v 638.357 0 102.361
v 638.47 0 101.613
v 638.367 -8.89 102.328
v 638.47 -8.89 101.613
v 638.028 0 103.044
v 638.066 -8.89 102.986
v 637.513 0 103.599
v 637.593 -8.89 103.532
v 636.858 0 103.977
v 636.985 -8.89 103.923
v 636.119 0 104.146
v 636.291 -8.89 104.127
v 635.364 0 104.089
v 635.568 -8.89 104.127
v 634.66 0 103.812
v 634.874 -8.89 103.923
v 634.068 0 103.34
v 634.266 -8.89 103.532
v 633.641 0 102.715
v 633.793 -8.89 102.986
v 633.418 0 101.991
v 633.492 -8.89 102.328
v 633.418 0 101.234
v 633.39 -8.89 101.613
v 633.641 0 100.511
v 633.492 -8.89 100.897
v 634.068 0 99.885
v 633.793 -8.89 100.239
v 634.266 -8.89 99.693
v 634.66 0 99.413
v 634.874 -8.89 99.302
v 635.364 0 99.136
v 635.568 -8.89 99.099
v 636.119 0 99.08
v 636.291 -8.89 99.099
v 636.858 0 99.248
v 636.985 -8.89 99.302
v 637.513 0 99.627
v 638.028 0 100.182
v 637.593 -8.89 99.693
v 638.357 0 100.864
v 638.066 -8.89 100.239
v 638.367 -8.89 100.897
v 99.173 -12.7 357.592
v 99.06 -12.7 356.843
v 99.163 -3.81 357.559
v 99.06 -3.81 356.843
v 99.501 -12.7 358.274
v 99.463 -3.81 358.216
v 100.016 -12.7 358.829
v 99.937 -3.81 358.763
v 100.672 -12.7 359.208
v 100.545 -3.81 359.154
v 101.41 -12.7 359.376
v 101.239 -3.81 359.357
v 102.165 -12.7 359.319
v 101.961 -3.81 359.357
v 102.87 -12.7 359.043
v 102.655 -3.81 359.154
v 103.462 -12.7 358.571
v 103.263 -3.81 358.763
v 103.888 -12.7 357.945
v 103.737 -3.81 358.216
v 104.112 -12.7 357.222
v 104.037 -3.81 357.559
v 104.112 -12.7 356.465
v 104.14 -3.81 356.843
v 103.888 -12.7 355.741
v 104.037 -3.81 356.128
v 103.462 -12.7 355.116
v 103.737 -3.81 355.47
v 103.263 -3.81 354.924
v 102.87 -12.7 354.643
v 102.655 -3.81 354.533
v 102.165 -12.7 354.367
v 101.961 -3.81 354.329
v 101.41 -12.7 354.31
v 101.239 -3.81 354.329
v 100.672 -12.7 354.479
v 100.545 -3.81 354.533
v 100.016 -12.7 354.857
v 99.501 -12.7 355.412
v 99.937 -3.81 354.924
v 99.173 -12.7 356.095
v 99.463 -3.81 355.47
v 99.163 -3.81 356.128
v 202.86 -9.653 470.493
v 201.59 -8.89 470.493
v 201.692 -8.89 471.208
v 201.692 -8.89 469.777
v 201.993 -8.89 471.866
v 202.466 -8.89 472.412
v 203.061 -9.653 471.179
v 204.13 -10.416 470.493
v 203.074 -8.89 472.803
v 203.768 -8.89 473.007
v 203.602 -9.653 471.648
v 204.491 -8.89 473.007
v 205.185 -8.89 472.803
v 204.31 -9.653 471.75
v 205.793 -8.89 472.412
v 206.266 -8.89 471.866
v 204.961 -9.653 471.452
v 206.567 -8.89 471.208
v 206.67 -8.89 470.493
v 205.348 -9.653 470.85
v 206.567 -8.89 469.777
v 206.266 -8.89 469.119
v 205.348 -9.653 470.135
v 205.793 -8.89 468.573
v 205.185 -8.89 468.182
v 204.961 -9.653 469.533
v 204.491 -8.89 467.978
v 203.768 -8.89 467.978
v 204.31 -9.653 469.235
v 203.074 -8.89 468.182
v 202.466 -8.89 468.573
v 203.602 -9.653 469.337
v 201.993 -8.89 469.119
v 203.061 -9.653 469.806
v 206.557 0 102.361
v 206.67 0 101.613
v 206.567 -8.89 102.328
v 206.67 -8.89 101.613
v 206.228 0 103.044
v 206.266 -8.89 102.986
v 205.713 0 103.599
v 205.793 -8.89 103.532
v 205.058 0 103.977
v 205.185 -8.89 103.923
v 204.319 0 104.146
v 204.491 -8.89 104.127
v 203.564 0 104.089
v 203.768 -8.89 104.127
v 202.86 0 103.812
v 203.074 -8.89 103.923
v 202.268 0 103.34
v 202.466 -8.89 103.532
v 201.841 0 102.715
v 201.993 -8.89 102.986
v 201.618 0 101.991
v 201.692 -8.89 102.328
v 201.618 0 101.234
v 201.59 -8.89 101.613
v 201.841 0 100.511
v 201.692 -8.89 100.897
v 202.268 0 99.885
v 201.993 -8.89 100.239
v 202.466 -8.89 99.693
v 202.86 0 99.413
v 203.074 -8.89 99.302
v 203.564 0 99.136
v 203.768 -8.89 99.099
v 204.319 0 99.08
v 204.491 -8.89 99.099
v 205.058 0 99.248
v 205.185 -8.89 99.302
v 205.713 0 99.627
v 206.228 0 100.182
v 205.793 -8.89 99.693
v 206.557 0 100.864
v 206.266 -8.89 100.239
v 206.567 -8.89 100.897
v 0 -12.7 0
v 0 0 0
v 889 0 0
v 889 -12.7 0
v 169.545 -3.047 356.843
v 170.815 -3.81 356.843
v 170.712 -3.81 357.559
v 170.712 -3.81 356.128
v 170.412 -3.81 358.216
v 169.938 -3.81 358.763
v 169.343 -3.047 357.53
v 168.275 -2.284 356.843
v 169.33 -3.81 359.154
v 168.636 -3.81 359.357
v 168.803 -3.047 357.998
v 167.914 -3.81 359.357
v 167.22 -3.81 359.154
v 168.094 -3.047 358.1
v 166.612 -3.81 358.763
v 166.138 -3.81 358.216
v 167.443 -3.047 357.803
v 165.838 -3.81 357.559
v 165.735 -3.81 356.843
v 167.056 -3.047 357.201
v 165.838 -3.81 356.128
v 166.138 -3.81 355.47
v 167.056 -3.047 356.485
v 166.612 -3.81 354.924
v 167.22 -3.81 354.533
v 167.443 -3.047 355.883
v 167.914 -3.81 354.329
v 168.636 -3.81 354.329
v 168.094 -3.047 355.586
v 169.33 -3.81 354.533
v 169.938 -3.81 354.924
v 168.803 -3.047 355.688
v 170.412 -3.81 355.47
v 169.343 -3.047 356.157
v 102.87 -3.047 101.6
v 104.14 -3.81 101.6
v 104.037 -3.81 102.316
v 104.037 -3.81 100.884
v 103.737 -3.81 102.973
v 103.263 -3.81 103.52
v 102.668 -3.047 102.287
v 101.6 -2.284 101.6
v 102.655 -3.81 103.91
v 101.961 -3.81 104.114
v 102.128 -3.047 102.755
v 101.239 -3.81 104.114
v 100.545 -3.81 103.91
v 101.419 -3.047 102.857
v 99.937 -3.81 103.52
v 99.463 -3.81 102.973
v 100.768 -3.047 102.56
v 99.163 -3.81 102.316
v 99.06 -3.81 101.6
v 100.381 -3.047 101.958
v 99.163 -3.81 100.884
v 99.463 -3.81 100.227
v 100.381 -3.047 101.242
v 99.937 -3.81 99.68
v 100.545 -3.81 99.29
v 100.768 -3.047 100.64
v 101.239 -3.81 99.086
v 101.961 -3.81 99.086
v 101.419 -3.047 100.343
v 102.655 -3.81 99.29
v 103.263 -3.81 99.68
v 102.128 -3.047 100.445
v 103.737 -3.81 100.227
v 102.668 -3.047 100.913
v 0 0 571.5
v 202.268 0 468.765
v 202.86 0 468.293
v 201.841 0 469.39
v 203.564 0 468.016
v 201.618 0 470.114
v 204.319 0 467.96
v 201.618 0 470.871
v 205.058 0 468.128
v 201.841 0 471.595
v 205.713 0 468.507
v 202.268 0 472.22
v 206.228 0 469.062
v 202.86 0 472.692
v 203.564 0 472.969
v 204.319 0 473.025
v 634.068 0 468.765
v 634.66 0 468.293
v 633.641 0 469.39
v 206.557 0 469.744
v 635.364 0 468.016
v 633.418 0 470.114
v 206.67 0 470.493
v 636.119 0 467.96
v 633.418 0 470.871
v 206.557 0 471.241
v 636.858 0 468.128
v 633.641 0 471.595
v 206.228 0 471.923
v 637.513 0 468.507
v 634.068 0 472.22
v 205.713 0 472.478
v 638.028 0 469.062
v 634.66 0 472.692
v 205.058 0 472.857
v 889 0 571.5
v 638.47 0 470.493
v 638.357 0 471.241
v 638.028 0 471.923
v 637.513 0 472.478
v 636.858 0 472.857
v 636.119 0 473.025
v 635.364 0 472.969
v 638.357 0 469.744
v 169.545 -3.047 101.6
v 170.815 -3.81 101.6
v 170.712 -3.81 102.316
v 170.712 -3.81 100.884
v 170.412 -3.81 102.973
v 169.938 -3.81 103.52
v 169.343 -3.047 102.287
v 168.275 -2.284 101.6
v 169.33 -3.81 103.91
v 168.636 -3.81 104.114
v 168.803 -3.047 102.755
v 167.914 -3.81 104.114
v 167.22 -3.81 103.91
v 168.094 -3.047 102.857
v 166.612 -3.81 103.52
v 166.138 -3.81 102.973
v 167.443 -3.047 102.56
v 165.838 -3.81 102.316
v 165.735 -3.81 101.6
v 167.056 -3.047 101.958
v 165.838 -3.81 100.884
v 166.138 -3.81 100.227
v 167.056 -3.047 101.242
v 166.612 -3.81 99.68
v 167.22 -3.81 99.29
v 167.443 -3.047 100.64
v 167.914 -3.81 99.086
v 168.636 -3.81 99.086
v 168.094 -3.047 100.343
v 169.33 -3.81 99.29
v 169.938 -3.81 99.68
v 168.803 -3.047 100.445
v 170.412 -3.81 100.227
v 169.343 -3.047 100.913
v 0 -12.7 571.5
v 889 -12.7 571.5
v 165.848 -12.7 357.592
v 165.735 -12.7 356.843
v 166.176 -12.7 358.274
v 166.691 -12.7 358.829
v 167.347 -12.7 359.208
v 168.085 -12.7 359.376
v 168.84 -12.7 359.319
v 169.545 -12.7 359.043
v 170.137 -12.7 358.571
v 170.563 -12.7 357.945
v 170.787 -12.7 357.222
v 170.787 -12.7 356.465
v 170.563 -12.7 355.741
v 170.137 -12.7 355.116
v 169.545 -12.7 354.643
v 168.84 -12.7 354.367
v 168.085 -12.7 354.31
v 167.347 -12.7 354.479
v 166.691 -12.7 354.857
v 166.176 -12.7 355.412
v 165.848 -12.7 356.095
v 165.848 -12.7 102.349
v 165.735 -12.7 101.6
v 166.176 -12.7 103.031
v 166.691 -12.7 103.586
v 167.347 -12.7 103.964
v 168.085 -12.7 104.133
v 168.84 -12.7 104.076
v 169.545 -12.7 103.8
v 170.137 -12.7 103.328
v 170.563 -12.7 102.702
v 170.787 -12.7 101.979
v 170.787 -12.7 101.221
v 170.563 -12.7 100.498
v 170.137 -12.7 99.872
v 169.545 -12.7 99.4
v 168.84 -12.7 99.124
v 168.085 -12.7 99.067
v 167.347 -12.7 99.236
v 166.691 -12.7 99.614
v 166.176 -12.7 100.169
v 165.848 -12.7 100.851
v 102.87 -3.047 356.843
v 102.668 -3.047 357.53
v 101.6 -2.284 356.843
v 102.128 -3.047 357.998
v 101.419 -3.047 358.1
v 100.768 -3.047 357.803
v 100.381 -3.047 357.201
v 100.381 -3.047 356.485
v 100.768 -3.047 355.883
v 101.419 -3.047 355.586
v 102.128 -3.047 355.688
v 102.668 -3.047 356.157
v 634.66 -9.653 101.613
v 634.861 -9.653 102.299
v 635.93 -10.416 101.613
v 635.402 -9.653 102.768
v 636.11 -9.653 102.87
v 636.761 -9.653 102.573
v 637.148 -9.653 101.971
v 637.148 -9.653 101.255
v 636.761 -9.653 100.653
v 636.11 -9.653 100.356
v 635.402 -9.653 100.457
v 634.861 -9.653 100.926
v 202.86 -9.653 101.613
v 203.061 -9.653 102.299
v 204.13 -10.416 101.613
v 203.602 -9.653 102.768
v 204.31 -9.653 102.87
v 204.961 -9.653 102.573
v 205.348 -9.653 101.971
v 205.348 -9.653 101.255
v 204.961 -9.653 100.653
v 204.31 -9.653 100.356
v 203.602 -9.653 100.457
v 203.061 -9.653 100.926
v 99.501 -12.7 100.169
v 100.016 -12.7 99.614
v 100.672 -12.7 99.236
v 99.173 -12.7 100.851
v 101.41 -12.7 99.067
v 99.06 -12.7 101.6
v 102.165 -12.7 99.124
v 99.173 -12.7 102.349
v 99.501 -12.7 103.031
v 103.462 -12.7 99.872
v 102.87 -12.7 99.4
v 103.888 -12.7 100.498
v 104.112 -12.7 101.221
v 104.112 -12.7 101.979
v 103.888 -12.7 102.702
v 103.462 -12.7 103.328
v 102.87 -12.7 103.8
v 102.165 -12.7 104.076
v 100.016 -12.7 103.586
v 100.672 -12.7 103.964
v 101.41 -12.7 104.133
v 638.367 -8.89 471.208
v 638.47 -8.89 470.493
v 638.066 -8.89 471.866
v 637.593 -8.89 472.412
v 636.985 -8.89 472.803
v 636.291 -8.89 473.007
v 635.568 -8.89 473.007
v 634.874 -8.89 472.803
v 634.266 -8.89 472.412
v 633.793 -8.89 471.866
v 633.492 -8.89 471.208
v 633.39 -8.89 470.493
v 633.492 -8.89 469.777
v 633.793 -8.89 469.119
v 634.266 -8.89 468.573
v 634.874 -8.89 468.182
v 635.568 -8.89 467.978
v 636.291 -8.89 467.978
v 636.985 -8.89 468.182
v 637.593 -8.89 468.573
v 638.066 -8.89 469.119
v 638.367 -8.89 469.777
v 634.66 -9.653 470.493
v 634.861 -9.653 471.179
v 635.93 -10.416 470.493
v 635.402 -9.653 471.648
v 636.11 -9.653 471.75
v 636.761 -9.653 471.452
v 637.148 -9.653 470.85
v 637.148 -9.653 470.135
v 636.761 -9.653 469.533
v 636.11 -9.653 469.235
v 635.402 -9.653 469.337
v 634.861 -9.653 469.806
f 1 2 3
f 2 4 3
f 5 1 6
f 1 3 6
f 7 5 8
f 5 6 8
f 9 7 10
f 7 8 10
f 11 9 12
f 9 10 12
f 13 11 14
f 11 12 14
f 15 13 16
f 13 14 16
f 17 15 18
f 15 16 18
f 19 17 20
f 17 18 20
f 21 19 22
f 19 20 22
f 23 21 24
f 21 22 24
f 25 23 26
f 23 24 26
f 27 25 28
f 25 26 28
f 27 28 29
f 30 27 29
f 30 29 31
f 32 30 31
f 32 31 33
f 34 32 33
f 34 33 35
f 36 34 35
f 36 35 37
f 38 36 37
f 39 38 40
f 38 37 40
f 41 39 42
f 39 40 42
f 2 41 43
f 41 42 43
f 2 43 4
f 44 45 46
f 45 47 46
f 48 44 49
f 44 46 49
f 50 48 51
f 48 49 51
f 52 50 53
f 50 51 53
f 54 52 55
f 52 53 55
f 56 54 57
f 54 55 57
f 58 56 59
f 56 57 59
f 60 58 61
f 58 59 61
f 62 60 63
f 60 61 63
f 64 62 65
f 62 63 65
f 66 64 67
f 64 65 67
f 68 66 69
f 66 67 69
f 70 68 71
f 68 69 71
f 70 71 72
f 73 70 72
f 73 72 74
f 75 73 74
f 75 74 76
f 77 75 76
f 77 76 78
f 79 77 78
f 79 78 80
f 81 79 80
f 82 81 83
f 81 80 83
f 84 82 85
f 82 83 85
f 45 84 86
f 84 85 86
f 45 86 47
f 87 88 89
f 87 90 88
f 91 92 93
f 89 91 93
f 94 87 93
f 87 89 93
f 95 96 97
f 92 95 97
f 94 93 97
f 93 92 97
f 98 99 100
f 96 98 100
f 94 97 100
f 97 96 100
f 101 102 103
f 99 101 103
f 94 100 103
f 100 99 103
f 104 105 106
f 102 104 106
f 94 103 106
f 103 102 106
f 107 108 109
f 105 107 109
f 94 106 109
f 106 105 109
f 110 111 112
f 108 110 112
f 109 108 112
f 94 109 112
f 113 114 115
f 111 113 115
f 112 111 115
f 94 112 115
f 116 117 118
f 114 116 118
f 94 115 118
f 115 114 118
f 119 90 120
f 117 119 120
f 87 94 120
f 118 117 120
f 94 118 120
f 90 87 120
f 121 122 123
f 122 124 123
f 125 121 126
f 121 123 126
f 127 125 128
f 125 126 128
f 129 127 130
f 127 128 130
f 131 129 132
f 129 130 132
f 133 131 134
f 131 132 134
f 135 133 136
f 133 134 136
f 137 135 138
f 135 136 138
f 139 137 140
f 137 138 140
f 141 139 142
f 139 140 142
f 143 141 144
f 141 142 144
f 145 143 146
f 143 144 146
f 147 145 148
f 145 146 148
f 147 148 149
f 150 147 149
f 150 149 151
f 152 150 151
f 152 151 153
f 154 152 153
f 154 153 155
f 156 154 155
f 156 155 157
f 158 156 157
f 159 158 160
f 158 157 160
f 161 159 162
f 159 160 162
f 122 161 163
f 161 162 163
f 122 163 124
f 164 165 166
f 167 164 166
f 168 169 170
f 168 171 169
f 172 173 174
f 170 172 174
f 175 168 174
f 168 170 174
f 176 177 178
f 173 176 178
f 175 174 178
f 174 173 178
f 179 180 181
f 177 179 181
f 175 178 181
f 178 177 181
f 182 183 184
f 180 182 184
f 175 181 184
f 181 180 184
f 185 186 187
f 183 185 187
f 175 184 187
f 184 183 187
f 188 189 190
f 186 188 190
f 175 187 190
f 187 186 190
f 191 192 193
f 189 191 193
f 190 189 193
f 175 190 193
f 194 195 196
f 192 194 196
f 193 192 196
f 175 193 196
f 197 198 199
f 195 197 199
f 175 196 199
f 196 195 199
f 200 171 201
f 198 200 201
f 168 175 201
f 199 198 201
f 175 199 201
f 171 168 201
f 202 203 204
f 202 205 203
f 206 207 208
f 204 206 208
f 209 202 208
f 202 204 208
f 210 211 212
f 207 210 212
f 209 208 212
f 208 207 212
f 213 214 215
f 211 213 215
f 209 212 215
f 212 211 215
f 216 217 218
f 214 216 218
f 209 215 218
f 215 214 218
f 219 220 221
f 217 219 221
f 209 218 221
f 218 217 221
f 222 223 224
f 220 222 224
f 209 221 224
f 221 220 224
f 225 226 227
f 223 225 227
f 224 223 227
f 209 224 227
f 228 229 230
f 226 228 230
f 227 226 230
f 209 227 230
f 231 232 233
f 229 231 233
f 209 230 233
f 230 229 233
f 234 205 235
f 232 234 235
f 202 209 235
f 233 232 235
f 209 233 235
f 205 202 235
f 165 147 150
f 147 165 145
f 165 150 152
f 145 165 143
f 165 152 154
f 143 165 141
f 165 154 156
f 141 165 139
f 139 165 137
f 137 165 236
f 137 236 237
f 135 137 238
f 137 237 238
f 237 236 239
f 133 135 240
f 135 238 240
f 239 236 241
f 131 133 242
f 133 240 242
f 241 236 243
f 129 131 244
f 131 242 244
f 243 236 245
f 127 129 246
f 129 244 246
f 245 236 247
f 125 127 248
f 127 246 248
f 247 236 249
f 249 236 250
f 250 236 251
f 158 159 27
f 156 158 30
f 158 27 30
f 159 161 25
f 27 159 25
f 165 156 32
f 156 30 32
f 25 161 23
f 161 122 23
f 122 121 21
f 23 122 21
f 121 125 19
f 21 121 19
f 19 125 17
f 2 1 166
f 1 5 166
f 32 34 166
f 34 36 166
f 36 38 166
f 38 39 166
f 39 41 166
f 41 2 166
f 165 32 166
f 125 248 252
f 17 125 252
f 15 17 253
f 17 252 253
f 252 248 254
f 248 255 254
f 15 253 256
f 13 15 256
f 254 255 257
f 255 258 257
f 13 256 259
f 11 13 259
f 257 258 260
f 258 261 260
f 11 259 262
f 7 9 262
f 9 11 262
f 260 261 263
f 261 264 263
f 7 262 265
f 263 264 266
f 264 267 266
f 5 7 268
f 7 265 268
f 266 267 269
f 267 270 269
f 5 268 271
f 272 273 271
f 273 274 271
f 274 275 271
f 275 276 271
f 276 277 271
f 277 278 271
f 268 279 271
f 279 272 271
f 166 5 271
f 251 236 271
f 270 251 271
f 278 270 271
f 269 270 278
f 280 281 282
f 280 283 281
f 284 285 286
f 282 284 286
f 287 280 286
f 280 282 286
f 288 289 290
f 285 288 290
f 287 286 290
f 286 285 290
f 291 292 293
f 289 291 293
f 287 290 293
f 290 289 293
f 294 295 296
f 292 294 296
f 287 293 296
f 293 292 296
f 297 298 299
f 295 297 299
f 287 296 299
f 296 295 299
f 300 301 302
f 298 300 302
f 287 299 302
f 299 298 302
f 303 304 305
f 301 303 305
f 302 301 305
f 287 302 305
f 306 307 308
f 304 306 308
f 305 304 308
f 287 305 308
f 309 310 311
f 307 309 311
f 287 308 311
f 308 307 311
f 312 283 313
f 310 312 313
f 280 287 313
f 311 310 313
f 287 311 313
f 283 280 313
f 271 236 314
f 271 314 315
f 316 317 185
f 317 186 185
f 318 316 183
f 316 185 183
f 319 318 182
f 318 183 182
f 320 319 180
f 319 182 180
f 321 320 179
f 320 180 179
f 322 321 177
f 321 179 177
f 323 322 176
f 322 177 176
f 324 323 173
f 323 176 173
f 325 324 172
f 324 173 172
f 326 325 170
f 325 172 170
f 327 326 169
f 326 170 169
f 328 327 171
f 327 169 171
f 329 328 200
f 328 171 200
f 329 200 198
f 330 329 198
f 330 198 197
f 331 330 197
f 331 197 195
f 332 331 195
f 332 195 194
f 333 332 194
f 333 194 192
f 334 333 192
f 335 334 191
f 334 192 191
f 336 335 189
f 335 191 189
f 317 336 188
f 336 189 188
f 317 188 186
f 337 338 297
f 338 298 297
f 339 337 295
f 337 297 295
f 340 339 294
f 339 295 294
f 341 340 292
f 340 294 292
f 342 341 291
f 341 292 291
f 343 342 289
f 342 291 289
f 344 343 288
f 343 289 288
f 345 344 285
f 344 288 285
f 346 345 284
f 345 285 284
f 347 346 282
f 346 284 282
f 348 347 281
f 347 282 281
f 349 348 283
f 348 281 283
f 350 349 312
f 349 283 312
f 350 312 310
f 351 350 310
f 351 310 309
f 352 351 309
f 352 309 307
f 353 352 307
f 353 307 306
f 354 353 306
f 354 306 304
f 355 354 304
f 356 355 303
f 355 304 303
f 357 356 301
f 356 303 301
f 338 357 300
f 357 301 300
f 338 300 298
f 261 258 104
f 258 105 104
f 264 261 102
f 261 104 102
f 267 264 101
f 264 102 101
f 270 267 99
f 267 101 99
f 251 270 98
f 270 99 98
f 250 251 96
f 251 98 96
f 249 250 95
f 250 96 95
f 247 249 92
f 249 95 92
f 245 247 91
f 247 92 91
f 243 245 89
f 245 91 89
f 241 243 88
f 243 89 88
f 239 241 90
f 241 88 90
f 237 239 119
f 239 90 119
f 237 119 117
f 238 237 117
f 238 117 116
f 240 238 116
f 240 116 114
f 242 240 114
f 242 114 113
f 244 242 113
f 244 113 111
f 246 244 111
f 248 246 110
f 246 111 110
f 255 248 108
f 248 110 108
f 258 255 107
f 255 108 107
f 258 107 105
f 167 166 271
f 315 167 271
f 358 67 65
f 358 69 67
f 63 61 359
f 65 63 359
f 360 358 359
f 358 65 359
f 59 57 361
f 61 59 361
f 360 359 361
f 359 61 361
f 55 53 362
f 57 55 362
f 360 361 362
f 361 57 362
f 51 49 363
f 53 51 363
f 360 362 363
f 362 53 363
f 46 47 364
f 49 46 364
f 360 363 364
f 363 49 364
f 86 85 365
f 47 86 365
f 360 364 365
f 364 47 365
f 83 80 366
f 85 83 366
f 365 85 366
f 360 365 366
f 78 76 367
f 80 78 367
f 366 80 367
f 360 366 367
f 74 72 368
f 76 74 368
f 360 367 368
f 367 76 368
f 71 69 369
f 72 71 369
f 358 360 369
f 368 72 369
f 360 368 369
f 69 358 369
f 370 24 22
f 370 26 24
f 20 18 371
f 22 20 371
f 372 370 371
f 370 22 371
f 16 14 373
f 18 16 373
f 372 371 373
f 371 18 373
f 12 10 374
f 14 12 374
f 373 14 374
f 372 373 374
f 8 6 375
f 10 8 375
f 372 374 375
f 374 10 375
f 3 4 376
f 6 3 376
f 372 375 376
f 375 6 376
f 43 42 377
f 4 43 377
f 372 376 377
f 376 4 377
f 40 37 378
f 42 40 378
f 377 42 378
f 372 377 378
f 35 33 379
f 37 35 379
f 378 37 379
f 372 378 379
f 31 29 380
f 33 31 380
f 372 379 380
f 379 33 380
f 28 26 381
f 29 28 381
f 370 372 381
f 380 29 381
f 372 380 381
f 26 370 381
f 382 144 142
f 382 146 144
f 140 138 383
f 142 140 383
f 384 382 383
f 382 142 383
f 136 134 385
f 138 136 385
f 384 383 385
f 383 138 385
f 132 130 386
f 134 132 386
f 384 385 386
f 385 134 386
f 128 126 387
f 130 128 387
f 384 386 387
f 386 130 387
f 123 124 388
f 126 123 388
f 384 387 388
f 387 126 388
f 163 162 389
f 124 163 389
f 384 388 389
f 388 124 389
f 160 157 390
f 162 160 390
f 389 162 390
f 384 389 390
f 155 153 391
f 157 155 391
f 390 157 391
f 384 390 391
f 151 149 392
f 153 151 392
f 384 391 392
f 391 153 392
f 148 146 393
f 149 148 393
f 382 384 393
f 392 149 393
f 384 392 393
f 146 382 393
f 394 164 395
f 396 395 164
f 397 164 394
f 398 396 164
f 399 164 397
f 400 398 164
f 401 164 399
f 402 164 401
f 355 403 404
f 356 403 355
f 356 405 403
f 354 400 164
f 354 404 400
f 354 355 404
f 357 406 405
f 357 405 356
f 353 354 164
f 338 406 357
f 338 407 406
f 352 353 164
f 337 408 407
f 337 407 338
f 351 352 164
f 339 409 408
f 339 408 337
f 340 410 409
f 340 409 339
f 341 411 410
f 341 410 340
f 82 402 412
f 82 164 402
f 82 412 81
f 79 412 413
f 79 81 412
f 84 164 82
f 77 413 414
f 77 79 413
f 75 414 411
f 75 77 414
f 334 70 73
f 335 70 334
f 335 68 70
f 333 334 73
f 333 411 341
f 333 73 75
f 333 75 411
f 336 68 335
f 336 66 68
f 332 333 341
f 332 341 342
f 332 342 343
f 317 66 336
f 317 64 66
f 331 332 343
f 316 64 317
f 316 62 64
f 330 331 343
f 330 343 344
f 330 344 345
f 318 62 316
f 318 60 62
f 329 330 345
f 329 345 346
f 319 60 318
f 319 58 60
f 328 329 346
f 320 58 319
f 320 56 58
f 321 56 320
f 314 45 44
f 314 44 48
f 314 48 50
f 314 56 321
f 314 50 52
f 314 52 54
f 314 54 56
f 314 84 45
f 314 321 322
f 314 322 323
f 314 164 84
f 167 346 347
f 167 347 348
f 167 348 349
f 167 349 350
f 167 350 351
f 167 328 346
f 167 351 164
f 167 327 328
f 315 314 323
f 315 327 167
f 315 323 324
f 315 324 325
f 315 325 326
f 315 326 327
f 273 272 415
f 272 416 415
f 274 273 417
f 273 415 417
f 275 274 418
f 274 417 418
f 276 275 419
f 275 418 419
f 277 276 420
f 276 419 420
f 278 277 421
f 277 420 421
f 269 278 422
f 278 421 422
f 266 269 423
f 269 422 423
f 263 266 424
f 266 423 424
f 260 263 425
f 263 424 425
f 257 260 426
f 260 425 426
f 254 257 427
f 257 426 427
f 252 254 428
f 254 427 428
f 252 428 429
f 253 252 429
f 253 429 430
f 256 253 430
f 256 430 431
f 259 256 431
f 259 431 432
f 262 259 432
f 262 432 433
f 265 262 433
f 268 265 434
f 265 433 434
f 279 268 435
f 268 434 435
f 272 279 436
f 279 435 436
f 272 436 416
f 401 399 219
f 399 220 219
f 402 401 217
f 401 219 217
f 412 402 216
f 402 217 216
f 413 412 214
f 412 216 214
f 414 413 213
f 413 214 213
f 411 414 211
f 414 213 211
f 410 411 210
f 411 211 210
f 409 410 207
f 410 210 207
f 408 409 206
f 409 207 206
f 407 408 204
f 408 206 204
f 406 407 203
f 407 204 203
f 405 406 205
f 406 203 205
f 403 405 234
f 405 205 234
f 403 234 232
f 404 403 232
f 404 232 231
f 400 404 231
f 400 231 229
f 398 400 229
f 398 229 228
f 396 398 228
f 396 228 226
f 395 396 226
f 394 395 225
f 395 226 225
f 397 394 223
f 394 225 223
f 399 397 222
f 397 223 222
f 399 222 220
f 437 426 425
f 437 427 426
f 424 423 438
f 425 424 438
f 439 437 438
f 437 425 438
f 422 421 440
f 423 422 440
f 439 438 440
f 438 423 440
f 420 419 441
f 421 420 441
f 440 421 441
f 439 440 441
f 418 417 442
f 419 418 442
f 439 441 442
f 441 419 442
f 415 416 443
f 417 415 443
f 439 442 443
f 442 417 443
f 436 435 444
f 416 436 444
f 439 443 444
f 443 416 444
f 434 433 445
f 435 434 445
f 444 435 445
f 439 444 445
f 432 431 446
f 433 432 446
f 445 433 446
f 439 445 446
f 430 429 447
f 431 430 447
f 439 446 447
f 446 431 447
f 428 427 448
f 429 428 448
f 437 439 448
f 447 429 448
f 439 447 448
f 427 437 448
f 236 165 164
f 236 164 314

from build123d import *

# Parameters (mm, degrees)
F0_W     = 889
F0_H     = 571.5
F1_DEPTH = 12.7
F3_D     = 5.08
F3_DEPTH = 8.89
F3_TIP   = 1.5261859723
F5_D     = 5.08
F5_DEPTH = 8.89
F5_TIP   = 1.5261859723


with BuildPart() as f1:
    # F0 (on Front) → F1 (new body)
    with BuildSketch(Plane.XZ):
        with Locations((444.5, 285.75)):
            Rectangle(F0_W, F0_H)
    extrude(amount=F1_DEPTH)

    # F3
    with Locations(Plane(origin=(0, 0, 0), x_dir=(-1, 0, 0), z_dir=(0, 1, 0))):
        with Locations((-635.9295617819, 470.4925119877), (-635.9295617819, 101.6127), (-204.1295617819, 101.6127), (-204.1295617819, 470.4925119877)):
            Hole(F3_D / 2, depth=F3_DEPTH)
            with Locations((0, 0, -(F3_DEPTH + F3_TIP / 2))):  # 118° drill point
                Cone(0, F3_D / 2, F3_TIP, mode=Mode.SUBTRACT)

    # F5
    with Locations(Plane.XZ.offset(12.7)):
        with Locations((101.6, 101.6), (168.275, 101.6), (101.6, 356.8431784153), (168.275, 356.8431784153)):
            Hole(F5_D / 2, depth=F5_DEPTH)
            with Locations((0, 0, -(F5_DEPTH + F5_TIP / 2))):  # 118° drill point
                Cone(0, F5_D / 2, F5_TIP, mode=Mode.SUBTRACT)


solid = f1.part
